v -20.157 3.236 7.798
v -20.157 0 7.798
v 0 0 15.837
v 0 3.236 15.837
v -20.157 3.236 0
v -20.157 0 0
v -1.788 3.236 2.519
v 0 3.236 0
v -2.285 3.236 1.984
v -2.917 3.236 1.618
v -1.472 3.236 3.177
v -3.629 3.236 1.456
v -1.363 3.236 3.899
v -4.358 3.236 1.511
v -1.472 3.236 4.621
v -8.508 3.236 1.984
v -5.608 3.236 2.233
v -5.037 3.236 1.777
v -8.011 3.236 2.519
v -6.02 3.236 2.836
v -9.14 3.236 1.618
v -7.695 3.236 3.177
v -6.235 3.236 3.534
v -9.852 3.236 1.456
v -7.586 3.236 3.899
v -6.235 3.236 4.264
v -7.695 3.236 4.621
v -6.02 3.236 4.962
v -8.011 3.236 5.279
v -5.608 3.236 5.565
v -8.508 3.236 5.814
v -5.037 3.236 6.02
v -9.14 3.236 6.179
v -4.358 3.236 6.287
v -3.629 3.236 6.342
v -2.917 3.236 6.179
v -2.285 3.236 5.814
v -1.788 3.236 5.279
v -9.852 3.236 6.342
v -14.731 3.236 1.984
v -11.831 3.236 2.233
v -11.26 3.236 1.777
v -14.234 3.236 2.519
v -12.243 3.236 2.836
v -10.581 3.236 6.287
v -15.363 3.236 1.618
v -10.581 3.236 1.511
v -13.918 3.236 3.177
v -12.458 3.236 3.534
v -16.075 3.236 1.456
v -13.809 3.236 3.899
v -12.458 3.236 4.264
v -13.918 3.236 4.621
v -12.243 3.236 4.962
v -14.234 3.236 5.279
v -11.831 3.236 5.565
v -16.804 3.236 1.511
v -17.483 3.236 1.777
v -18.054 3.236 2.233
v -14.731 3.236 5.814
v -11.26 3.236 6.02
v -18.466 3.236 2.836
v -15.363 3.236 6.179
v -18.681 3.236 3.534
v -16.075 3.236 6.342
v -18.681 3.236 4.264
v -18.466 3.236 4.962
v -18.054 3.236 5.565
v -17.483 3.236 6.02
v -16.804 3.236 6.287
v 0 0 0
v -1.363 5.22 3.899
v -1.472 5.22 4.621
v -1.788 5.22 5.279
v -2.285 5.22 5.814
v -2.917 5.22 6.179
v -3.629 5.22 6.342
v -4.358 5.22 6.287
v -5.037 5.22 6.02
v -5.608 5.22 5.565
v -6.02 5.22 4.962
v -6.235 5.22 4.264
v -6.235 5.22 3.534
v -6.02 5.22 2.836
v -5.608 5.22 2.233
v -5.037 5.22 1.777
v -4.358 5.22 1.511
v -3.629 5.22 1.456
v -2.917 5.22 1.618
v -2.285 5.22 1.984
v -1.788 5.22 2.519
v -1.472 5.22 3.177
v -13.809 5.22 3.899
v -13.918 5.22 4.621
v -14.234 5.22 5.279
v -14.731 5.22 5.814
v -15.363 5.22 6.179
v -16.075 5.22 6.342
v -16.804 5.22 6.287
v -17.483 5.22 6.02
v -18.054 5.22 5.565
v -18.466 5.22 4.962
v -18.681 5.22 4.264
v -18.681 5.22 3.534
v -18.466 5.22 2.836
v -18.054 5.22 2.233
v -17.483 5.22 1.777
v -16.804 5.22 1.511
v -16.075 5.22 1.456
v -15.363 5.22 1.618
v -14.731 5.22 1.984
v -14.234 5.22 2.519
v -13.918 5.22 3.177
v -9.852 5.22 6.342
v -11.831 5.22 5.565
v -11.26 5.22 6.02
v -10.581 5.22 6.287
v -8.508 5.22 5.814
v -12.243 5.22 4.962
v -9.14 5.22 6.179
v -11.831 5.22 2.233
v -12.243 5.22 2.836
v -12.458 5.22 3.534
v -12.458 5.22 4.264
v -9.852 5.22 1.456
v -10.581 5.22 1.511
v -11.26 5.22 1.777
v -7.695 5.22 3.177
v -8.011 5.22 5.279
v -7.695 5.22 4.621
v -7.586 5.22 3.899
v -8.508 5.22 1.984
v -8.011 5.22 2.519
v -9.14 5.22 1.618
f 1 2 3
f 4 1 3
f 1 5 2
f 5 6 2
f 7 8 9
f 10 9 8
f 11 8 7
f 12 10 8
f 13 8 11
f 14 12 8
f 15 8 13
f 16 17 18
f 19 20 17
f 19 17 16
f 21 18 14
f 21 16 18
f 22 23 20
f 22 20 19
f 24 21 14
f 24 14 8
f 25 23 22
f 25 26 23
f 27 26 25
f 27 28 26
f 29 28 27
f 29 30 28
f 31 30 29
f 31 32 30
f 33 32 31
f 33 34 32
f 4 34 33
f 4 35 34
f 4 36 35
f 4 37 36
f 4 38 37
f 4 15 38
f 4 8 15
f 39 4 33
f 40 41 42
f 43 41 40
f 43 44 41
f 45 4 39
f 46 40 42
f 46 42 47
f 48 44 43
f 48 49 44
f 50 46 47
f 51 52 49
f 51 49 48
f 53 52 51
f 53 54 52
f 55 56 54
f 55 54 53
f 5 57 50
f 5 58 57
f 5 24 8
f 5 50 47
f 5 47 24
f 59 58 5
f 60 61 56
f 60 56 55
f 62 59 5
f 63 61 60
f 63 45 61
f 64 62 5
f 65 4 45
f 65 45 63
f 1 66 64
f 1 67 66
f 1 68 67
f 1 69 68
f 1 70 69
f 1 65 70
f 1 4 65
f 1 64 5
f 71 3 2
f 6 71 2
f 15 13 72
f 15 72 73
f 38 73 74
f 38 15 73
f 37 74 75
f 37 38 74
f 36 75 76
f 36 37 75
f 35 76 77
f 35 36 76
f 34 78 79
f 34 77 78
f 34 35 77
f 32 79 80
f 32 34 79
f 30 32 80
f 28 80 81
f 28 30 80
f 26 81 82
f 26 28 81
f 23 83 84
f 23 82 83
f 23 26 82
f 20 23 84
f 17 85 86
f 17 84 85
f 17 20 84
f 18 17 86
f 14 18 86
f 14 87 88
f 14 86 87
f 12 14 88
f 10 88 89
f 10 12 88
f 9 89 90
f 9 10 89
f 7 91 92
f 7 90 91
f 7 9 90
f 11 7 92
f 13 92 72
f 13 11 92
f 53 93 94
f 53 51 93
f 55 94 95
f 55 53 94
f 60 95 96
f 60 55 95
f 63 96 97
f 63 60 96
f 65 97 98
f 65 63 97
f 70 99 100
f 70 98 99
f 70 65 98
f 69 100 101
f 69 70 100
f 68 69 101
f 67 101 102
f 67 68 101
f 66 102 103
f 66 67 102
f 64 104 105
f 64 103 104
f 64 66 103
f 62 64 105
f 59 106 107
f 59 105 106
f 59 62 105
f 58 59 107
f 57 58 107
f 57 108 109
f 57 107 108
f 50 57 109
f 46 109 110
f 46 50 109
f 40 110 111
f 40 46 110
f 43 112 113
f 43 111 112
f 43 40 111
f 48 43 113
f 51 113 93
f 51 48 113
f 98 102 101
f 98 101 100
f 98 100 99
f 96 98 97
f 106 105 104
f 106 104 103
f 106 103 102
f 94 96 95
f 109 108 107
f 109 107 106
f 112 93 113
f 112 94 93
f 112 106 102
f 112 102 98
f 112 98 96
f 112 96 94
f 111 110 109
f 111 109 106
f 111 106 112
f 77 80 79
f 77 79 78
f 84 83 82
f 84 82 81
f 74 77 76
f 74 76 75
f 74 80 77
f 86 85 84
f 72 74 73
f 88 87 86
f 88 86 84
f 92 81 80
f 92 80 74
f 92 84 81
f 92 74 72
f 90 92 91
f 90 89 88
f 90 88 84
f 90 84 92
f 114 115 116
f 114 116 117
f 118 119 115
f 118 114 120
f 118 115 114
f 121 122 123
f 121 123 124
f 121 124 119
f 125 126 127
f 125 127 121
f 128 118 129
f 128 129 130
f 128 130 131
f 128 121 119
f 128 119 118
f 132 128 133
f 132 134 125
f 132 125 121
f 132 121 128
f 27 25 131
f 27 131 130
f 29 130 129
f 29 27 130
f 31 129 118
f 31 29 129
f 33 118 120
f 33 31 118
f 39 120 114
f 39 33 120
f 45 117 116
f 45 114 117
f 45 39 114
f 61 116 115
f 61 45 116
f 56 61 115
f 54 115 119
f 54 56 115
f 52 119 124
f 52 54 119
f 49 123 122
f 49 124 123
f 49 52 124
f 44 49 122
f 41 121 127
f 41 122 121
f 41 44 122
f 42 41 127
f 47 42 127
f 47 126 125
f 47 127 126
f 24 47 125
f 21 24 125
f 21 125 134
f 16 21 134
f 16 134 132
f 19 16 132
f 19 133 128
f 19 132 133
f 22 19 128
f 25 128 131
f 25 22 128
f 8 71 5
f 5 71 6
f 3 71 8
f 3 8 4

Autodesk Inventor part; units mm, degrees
ref_plane "YZ Plane" through (0, 0, 0) normal (1, 0, 0) x (0, 1, 0)
ref_plane "XZ Plane" through (0, 0, 0) normal (0, 1, 0) x (-1, 0, 0)
ref_plane "XY Plane" through (0, 0, 0) normal (0, 0, 1) x (1, 0, 0)
sketch "Sketch1" plane through (0, 0, 0) normal (0, 1, 0) x (-1, 0, 0)
  line L0 (0, 0) -> (0, 15.8369)
  line L1 (0, 0) -> (20.1574, 0)
  line L2 (20.1574, 0) -> (20.1574, 7.7978)
  line L3 (20.1574, 7.7978) -> (0, 15.8369)
  dimension "d0" = 15.8369
  dimension "d1" = 20.1574
  dimension "d2" = 7.7978
extrude "Extrusion1" add sketch "Sketch1" along normal blind 3.236
sketch "Sketch2" plane through (0, 3.236, 0) normal (0, 1, 0) x (1, 0, 0)
  line L0 (-20.1574, -7.7978) -> (0, -15.8369) projected
  line L1 (-20.1574, 0) -> (-20.1574, -7.7978)
  line L2 (0, 0) -> (-20.1574, 0) projected
  line L3 (-20.1574, 0) -> (-20.1574, -7.7978)
  circle A0 centre (-16.2585, -3.8989) radius 2.4498
  dimension "d7" = 4.8997
extrude "Extrusion2" add sketch "Sketch2" along normal blind 1.9837
pattern_linear "Rectangular Pattern1" count 3 spacing 6.223 along (1, 0, 0) of "Extrusion2"
properties part number "other diagonal piece"
